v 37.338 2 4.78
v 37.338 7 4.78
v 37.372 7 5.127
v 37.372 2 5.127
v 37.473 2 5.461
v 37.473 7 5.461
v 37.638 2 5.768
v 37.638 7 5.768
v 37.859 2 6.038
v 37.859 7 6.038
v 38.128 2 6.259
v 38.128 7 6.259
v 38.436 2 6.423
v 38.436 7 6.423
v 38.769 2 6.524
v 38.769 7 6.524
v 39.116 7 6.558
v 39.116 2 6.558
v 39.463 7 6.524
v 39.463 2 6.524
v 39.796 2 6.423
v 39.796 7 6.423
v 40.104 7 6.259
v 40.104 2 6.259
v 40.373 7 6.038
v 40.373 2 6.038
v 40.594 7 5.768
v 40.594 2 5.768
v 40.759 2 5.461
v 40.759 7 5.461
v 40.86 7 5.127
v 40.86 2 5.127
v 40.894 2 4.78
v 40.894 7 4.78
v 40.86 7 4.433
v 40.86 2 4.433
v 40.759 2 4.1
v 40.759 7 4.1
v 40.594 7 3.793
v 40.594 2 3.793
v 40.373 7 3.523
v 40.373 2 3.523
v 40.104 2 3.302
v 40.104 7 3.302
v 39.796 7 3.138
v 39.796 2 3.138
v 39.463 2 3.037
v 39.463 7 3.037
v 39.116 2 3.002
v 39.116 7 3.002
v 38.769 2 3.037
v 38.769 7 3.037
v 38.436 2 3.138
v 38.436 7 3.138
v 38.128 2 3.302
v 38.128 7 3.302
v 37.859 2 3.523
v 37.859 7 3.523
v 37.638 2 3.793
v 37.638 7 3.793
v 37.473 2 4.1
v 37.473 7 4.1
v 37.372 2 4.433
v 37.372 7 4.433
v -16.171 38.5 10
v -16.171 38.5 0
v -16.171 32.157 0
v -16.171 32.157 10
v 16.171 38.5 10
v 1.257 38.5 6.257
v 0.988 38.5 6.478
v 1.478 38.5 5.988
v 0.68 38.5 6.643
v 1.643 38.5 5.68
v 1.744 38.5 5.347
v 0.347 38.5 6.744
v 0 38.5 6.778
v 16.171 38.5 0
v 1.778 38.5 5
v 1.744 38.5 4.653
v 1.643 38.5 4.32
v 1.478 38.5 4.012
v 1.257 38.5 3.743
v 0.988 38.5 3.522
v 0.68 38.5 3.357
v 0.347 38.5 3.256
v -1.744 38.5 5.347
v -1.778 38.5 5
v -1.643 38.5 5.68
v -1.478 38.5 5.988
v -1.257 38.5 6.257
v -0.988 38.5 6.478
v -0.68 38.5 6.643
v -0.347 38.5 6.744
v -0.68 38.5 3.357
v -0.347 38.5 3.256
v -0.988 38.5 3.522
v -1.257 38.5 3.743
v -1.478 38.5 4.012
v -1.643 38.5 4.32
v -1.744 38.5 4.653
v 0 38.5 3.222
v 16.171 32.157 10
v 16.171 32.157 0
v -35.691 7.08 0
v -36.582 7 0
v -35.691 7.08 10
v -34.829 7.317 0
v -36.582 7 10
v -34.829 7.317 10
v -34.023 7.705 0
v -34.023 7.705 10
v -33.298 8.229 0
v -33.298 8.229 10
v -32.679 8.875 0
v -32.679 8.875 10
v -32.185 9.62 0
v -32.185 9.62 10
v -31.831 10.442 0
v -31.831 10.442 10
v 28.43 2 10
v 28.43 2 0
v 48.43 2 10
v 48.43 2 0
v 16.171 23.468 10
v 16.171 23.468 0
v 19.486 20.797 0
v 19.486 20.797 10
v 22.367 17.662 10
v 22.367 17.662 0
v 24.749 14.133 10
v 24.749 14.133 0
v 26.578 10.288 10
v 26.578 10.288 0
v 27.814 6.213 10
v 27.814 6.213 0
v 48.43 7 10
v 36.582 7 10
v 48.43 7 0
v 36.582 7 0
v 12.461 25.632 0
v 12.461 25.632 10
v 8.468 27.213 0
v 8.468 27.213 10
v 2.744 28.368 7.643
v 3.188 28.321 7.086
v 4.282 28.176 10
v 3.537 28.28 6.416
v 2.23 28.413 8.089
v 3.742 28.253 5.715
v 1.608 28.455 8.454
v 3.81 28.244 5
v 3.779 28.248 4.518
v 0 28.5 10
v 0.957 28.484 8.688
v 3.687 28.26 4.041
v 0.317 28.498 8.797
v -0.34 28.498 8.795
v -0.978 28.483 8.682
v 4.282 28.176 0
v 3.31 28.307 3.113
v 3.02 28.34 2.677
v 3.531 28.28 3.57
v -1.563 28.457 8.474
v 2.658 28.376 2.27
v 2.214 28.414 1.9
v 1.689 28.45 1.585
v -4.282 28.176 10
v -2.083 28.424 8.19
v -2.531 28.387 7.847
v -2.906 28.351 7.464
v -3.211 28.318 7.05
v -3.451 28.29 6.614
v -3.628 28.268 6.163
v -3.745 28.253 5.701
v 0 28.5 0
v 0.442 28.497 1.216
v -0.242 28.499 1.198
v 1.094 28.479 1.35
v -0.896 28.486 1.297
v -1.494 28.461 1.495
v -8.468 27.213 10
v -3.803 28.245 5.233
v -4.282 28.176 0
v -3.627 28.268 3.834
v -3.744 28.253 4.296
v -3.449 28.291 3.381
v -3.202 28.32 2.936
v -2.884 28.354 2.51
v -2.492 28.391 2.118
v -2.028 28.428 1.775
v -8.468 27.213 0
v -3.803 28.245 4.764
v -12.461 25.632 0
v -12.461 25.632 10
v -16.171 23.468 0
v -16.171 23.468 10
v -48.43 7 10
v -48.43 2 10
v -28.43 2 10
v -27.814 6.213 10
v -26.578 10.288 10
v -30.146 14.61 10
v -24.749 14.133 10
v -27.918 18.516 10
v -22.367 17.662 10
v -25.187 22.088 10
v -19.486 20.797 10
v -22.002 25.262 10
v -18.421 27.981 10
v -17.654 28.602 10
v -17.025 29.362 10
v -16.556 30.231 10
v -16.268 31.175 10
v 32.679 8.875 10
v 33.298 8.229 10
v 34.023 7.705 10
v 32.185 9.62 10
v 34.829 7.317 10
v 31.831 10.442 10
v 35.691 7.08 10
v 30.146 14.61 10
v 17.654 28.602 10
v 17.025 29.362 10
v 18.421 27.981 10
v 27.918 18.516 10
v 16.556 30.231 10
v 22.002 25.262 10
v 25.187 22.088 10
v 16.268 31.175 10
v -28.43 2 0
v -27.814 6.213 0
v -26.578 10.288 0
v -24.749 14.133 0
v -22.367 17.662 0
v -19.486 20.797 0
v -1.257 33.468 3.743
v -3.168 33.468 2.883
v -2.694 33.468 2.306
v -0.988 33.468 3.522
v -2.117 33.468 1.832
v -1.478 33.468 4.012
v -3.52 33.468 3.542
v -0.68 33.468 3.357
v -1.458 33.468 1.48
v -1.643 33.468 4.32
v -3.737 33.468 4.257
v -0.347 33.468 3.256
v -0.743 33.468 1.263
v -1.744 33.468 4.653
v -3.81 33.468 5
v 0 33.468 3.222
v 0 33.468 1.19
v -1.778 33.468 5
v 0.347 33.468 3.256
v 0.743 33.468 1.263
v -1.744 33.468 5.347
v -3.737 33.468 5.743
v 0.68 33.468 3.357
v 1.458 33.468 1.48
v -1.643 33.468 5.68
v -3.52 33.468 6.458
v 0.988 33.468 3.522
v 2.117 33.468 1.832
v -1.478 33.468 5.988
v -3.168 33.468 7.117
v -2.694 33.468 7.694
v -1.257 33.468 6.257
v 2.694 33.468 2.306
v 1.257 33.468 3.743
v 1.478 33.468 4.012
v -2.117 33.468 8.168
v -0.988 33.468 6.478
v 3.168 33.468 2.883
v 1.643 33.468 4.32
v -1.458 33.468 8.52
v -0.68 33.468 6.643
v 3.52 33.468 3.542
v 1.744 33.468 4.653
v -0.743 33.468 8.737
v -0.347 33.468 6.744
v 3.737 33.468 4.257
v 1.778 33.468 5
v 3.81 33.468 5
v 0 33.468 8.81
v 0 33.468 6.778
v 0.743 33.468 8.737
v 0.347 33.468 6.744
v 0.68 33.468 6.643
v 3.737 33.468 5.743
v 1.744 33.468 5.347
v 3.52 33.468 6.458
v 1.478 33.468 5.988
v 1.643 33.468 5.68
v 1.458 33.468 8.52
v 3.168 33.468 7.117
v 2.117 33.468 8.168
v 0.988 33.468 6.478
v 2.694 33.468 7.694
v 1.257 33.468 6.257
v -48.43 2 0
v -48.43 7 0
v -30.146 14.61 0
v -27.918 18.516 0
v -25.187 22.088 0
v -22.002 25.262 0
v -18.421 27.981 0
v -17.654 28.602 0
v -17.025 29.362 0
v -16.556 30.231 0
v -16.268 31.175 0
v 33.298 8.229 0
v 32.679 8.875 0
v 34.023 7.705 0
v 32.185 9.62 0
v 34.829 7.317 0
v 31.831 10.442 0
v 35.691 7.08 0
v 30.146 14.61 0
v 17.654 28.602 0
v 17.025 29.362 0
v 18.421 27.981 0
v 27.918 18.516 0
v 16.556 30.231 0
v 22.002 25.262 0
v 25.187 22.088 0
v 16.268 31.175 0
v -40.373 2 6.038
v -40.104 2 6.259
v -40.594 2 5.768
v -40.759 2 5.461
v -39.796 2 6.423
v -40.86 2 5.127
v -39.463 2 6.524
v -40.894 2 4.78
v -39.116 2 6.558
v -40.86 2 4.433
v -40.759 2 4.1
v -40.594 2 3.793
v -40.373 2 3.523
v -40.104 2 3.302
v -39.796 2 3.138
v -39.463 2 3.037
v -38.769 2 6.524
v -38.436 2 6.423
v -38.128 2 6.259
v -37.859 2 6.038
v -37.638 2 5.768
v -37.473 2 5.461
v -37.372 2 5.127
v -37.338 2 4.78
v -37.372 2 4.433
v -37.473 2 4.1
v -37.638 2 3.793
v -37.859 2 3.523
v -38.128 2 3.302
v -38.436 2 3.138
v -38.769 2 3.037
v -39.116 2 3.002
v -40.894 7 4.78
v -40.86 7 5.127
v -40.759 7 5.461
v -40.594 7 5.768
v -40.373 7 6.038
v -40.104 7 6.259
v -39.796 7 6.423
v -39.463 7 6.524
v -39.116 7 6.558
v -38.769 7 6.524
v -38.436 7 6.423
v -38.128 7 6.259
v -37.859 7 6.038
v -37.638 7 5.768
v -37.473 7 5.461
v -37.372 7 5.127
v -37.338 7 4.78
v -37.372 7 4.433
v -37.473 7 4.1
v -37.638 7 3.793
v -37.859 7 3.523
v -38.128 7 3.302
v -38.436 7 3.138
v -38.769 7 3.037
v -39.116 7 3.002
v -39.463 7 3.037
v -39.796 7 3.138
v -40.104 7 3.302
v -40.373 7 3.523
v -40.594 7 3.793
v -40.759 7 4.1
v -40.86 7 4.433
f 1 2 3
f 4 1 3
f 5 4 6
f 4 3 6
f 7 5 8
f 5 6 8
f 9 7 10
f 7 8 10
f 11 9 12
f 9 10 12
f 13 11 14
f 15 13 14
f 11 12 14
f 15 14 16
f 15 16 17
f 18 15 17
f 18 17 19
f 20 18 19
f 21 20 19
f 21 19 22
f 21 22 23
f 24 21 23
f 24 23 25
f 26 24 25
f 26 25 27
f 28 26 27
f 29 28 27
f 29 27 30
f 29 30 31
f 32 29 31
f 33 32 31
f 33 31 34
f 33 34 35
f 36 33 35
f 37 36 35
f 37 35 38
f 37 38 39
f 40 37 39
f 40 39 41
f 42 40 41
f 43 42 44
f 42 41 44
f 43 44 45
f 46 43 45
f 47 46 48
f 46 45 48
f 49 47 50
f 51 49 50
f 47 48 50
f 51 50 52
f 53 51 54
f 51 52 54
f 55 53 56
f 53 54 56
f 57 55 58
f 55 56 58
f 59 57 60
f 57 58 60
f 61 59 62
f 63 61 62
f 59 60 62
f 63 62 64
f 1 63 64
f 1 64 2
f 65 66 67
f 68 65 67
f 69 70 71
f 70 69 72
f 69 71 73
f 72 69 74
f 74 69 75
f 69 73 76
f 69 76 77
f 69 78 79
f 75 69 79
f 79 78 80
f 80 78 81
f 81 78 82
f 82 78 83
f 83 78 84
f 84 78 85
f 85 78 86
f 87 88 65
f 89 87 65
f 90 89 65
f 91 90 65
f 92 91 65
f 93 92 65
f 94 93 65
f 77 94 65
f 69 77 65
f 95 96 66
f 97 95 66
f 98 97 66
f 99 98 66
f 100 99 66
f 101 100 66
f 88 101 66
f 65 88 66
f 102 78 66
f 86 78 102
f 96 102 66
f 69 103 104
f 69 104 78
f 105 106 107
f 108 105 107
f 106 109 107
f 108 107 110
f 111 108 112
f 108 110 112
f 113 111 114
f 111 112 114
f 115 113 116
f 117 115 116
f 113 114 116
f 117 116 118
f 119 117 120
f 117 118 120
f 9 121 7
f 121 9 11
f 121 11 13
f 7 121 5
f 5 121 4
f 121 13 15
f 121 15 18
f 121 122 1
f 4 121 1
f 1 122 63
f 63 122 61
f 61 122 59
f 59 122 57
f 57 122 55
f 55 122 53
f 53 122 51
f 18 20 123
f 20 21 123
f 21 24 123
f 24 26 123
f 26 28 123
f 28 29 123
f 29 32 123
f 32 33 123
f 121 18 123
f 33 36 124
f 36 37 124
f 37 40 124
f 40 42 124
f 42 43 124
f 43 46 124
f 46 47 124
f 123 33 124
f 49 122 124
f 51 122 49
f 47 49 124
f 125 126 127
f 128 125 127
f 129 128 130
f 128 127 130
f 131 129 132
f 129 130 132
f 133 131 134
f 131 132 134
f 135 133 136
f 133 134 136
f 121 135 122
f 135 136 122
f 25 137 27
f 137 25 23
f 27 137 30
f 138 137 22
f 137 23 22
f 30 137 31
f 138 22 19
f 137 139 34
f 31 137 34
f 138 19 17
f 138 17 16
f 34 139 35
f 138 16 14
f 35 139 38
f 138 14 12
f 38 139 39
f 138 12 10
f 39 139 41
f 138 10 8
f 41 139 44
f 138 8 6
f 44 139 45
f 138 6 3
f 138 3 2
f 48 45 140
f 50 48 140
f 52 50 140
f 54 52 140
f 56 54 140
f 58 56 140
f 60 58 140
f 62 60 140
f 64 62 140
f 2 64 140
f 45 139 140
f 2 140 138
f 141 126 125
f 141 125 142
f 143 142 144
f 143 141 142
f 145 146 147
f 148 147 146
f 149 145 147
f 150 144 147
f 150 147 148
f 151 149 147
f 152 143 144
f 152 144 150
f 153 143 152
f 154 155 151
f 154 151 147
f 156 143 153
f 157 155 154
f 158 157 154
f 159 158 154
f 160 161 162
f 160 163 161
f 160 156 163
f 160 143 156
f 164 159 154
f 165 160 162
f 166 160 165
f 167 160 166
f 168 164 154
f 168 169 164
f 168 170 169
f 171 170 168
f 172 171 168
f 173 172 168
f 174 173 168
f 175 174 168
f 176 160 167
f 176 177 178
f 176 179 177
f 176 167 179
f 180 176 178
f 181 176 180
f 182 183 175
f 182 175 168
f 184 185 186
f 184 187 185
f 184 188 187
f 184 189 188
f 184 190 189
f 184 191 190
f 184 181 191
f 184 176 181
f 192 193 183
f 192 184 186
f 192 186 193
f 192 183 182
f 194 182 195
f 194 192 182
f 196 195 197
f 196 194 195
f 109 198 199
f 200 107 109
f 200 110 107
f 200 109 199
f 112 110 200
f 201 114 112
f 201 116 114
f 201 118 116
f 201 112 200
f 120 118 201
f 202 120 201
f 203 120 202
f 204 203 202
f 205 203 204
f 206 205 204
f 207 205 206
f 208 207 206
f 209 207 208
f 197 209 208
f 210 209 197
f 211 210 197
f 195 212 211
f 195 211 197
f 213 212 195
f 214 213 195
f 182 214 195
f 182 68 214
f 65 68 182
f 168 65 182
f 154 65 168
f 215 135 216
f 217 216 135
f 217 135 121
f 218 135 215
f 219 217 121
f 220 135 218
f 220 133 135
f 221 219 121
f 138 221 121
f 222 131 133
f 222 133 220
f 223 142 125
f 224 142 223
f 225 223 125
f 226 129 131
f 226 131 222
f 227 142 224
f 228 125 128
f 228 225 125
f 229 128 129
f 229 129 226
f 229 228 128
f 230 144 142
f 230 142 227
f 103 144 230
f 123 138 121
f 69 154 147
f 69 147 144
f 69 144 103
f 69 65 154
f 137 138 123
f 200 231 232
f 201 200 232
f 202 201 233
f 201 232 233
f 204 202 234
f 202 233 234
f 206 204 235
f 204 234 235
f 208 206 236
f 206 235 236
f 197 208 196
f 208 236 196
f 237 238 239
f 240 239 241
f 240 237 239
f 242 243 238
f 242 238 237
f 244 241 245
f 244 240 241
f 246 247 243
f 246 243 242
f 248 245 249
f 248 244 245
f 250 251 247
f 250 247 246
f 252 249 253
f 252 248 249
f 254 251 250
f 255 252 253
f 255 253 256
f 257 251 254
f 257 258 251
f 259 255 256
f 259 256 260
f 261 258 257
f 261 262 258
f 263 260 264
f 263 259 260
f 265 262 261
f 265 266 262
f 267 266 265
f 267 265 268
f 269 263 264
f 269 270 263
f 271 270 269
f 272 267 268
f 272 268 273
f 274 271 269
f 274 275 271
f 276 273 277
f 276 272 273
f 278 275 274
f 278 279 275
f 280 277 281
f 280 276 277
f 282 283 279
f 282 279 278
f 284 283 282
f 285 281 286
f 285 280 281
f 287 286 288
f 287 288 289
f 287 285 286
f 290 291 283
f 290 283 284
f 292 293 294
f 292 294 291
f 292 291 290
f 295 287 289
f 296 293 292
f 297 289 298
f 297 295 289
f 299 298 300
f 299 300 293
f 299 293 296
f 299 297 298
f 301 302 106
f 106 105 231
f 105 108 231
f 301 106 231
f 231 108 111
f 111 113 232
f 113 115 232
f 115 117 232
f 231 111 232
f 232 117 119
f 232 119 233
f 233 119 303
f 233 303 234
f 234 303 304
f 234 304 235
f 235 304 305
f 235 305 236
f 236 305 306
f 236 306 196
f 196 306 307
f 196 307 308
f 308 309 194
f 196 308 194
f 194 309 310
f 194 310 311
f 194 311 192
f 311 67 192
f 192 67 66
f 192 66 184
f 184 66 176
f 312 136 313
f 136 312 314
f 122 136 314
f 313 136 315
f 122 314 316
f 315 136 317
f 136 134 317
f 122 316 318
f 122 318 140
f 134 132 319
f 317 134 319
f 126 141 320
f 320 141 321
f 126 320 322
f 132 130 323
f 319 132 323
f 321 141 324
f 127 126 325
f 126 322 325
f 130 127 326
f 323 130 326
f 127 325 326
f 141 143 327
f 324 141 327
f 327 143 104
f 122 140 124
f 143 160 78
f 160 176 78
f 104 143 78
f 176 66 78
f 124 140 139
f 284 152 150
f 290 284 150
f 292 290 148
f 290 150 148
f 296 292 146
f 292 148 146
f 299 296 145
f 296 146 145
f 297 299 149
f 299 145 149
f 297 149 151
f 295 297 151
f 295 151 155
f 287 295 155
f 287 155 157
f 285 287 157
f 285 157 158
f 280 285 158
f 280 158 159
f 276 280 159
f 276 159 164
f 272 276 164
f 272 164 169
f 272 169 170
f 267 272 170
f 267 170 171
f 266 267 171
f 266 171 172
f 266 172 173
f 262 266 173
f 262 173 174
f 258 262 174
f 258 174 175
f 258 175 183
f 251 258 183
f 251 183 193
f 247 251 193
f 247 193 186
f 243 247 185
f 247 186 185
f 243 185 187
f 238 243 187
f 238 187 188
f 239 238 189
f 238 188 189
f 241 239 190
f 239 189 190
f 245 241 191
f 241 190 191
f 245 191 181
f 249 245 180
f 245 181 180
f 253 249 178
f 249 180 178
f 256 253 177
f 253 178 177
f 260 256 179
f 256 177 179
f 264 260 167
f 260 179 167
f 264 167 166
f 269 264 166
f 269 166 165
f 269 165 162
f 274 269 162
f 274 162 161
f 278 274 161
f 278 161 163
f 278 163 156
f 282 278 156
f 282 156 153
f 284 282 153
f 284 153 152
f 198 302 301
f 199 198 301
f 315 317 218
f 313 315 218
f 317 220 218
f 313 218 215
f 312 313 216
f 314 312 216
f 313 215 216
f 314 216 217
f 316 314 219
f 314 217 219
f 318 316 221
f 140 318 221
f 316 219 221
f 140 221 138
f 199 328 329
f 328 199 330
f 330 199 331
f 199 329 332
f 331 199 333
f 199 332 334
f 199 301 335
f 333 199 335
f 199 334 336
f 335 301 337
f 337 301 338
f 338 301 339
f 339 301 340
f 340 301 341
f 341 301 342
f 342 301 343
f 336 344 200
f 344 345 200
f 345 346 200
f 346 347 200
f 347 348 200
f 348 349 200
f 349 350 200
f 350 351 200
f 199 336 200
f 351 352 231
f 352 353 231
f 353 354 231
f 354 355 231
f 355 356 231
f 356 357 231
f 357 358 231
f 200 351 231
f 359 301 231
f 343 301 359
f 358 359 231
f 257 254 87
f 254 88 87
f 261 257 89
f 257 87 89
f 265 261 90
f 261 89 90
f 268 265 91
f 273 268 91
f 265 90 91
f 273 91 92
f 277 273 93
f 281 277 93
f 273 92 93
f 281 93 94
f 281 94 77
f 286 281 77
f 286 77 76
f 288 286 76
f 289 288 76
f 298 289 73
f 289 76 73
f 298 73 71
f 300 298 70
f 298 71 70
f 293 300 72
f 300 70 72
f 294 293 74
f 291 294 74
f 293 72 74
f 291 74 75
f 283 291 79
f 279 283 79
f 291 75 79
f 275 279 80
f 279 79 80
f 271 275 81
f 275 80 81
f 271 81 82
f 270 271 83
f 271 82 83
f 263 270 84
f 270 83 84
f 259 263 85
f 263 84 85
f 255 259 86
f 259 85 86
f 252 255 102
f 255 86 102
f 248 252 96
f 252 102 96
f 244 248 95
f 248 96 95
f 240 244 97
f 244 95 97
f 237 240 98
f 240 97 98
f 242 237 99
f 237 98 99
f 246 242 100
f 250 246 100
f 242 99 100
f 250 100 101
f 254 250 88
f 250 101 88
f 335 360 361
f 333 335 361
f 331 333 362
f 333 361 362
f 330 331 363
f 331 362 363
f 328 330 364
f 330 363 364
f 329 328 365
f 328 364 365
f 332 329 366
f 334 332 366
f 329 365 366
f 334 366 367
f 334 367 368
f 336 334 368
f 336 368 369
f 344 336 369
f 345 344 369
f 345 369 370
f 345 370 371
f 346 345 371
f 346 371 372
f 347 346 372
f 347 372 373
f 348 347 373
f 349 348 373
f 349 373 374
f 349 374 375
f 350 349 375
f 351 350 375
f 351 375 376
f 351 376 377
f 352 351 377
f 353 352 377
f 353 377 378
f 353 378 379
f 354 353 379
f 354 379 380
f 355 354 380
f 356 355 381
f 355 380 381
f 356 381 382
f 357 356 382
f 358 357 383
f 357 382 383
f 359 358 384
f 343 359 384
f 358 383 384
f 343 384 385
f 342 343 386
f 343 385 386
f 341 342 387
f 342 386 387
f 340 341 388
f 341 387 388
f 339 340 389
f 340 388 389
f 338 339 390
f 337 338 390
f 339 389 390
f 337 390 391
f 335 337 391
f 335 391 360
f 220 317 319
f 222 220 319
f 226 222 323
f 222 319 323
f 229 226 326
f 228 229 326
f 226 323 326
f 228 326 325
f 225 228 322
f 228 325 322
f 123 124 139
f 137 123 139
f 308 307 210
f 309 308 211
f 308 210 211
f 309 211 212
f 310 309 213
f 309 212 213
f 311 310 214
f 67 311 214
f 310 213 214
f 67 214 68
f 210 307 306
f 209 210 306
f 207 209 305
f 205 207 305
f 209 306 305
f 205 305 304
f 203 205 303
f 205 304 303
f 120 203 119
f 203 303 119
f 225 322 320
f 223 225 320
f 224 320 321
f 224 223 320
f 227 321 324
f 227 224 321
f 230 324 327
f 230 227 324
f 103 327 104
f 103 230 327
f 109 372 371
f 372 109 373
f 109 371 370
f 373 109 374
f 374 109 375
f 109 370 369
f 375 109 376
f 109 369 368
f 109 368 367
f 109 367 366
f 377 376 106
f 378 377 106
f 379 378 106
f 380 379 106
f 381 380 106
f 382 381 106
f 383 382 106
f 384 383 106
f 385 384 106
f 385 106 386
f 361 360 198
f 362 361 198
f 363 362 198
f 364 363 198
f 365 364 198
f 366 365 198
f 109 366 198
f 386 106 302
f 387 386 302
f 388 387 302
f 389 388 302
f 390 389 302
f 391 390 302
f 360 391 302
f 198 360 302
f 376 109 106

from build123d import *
from build123d import SkipClean  # not in build123d's __all__

# Parameters (mm, degrees)
F1_DEPTH       = 10
F3_D           = 3.556
F3_CBORE_D     = 7.62
F3_CBORE_DEPTH = 10
F4_DEPTH       = 10.001
F6_D           = 3.556
F7_R           = 5


# Not quite as in the source:
# - a feature names something its author has since deleted; it is built from what else it names


with BuildPart() as f1:
    # F0 (on Top) → F1 (new body)
    with BuildSketch(Plane.XY):
        with BuildLine():
            ThreePointArc((16.1705551086, 23.468343518), (24.7491207645, 14.1326225939), (28.4297379517, 2))
            Line((28.4297379517, 2), (28.4297379517, 7))
            Line((28.4297379517, 7), (32.7604945018, 7))
            ThreePointArc((32.7604945018, 7), (26.8945535829, 19.9733068763), (16.1705551086, 29.3387652685))
            Line((16.1705551086, 29.3387652685), (16.1705551086, 23.468343518))
        make_face()
        with BuildLine():
            ThreePointArc((-16.1705551086, 23.468343518), (0, 28.5), (16.1705551086, 23.468343518))
            Line((16.1705551086, 23.468343518), (16.1705551086, 29.3387652685))
            Line((16.1705551086, 29.3387652685), (-16.1705551086, 29.3387652685))
            Line((-16.1705551086, 29.3387652685), (-16.1705551086, 23.468343518))
        make_face()
        with BuildLine():
            ThreePointArc((-28.4297379517, 2), (-24.7491207645, 14.1326225939), (-16.1705551086, 23.468343518))
            Line((-16.1705551086, 23.468343518), (-16.1705551086, 29.3387652685))
            ThreePointArc((-16.1705551086, 29.3387652685), (-26.8945535829, 19.9733068763), (-32.7604945018, 7))
            Line((-32.7604945018, 7), (-28.4297379517, 7))
            Line((-28.4297379517, 7), (-28.4297379517, 2))
        make_face()
        with BuildLine():
            Line((-48.4297379517, 2), (-33.4402452144, 2))
            ThreePointArc((-33.4402452144, 2), (-33.1946454228, 4.5128167765), (-32.7604945018, 7))
            Line((-32.7604945018, 7), (-48.4297379517, 7))
            Line((-48.4297379517, 7), (-48.4297379517, 2))
        make_face()
        with BuildLine():
            Line((-33.4402452144, 2), (-28.4297379517, 2))
            Line((-28.4297379517, 2), (-28.4297379517, 7))
            Line((-28.4297379517, 7), (-32.7604945018, 7))
            ThreePointArc((-32.7604945018, 7), (-33.1946454228, 4.5128167765), (-33.4402452144, 2))
        make_face()
        with BuildLine():
            Line((28.4297379517, 7), (28.4297379517, 2))
            Line((28.4297379517, 2), (33.4402452144, 2))
            ThreePointArc((33.4402452144, 2), (33.1946454228, 4.5128167765), (32.7604945018, 7))
            Line((32.7604945018, 7), (28.4297379517, 7))
        make_face()
        with BuildLine():
            ThreePointArc((32.7604945018, 7), (33.1946454228, 4.5128167765), (33.4402452144, 2))
            Line((33.4402452144, 2), (48.4297379517, 2))
            Line((48.4297379517, 2), (48.4297379517, 7))
            Line((48.4297379517, 7), (32.7604945018, 7))
        make_face()
        with BuildLine():
            Line((-16.1705551086, 33.5), (-16.1705551086, 29.3387652685))
            ThreePointArc((-16.1705551086, 29.3387652685), (-8.3486933282, 32.4430165014), (1.811e-07, 33.5))
            Line((1.811e-07, 33.5), (-16.1705551086, 33.5))
        make_face()
        with BuildLine():
            ThreePointArc((1.811e-07, 33.5), (8.3486935036, 32.4430164563), (16.1705551086, 29.3387652685))
            Line((16.1705551086, 29.3387652685), (16.1705551086, 33.5))
            Line((16.1705551086, 33.5), (1.811e-07, 33.5))
        make_face()
        with BuildLine():
            Line((-16.1705551086, 23.468343518), (16.1705551086, 23.468343518))
            ThreePointArc((16.1705551086, 23.468343518), (0, 28.5), (-16.1705551086, 23.468343518))
        make_face()
        Polygon((-16.1705551086, 33.5), (1.811e-07, 33.5), (16.1705551086, 33.5), (16.1705551086, 38.5), (-16.1705551086, 38.5), align=None)
        with BuildLine():
            Line((-16.1705551086, 29.3387652685), (16.1705551086, 29.3387652685))
            ThreePointArc((16.1705551086, 29.3387652685), (8.3486935036, 32.4430164563), (1.811e-07, 33.5))
            ThreePointArc((1.811e-07, 33.5), (-8.3486933282, 32.4430165014), (-16.1705551086, 29.3387652685))
        make_face()
    extrude(amount=F1_DEPTH)

    # F3 (through all)
    with Locations(Plane.XZ.offset(-23.468343518)):
        with Locations((0, 5)):
            CounterBoreHole(F3_D / 2, F3_CBORE_D / 2, F3_CBORE_DEPTH)

    # F0 (on Top) → F4 (cut, through all)
    with BuildSketch(Plane.XY):
        with BuildLine():
            Line((-16.1705551086, 23.468343518), (16.1705551086, 23.468343518))
            ThreePointArc((16.1705551086, 23.468343518), (0, 28.5), (-16.1705551086, 23.468343518))
        make_face()
    with SkipClean():  # cleaning this boolean's faces spoils the solid; the shape is the same uncleaned
        extrude(amount=F4_DEPTH, mode=Mode.SUBTRACT)

    # F6 (through all)
    with Locations(Plane.XZ.offset(-2)):
        with Locations((-39.116, 4.78035165), (39.116, 4.78035165)):
            Hole(F6_D / 2)

    # F7
    f7_edges = [f1.edges().sort_by_distance(p)[0] for p in [
        (-32.760495, 7, 5),
        (32.760495, 7, 5),
        (16.170555, 29.338765, 5),
        (-16.170555, 29.338765, 5),
    ]]
    fillet(f7_edges, radius=F7_R)


solid = f1.part
